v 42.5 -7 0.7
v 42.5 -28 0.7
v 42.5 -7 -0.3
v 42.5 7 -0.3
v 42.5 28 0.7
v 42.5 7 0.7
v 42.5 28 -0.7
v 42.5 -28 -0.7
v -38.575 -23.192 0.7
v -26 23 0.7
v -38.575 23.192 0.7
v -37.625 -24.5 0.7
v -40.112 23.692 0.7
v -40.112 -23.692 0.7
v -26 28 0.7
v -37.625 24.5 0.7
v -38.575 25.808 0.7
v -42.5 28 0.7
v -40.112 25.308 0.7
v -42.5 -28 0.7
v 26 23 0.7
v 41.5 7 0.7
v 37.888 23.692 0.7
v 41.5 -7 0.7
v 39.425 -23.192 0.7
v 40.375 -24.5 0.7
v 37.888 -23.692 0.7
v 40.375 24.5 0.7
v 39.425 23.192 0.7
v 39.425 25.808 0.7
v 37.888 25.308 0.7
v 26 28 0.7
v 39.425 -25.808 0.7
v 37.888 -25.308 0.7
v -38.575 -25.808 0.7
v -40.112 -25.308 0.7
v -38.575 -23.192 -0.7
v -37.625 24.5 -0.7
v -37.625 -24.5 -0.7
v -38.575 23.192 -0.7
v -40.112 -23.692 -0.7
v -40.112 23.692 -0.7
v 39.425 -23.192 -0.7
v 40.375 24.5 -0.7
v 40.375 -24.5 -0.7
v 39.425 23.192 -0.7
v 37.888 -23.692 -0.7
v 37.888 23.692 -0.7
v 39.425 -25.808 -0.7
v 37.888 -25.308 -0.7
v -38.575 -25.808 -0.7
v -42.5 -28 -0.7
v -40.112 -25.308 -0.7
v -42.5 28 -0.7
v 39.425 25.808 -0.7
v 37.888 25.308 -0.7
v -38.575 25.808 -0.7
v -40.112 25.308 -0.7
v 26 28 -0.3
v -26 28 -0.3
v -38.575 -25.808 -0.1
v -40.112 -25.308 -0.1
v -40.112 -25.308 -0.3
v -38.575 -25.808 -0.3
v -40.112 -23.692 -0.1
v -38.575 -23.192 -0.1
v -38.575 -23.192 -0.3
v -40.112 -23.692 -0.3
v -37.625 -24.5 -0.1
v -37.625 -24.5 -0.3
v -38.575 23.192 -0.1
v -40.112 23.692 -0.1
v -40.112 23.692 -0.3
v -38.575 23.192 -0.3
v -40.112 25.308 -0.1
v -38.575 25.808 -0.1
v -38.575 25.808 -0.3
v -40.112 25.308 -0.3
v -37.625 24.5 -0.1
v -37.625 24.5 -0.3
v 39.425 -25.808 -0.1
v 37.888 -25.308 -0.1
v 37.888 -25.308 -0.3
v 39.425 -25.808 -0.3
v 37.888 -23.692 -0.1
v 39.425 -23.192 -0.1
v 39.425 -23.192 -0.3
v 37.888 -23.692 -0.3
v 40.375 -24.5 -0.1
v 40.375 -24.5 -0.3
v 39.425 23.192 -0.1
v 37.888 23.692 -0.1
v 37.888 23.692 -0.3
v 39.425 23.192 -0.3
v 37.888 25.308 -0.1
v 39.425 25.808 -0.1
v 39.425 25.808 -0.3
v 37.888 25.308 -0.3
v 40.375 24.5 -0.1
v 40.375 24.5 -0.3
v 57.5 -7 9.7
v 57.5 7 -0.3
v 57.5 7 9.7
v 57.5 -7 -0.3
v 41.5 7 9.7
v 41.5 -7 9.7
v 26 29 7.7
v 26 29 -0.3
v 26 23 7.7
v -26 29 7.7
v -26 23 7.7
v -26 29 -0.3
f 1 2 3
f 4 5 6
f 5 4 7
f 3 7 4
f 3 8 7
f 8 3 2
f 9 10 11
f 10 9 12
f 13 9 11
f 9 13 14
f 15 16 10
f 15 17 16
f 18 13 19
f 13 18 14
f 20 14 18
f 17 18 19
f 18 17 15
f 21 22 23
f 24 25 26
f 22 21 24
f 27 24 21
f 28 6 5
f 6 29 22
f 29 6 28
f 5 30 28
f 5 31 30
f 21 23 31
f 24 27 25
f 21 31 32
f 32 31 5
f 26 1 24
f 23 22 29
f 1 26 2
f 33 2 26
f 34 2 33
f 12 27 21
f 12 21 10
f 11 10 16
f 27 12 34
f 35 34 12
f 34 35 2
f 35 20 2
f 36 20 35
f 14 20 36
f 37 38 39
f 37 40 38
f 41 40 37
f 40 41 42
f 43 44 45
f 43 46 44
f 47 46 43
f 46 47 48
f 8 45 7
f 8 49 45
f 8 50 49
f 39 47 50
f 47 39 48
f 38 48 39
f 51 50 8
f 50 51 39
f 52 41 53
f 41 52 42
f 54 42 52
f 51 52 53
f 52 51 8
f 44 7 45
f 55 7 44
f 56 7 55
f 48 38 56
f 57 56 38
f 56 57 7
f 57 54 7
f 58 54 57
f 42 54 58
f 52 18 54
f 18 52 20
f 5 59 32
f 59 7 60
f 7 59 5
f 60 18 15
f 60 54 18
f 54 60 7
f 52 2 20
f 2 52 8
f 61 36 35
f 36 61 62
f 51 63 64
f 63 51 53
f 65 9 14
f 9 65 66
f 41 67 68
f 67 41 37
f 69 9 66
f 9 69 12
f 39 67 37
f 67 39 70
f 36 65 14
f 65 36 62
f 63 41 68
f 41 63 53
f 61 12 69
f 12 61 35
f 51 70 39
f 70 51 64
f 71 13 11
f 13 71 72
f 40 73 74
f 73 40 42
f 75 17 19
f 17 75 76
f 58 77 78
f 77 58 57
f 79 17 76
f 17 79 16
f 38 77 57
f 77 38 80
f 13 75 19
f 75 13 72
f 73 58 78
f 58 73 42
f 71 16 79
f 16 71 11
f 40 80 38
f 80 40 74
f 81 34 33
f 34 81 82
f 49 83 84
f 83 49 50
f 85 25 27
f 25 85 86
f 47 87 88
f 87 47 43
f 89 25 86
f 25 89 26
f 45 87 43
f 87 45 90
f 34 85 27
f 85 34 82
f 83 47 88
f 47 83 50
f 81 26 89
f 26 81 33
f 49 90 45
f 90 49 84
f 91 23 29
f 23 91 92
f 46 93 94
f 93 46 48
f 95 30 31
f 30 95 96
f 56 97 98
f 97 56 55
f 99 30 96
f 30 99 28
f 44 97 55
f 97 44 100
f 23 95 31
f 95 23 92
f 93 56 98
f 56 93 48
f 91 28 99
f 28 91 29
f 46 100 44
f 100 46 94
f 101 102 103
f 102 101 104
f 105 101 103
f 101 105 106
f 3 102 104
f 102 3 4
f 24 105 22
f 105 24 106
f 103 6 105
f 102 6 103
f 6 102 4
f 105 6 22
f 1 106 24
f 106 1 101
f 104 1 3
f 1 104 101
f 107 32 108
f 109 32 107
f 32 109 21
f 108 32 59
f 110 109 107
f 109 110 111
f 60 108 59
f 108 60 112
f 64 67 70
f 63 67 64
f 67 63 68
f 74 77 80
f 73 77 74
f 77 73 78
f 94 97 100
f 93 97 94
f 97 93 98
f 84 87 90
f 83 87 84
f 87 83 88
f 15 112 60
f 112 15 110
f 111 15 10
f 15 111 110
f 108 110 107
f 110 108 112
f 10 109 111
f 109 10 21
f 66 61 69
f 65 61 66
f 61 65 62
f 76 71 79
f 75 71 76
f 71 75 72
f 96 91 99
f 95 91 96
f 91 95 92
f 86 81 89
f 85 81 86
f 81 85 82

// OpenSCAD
// Parameters
pcb_length = 85; //[42.5:170:0.5]
pcb_width = 56; //[28:112:0.5]
pcb_thickness = 1.4; //[0.7:2.8:0.1]
corner_radius = 3; //[1.5:6:0.5]
mount_hole_diameter = 2.75; //[2:4:0.05]
mount_hole_edge_offset_x = 3.5; //[2:7:0.25]
mount_hole_edge_offset_y = 3.5; //[2:7:0.25]
hole_cut_extra_height = 2; //[1:5:0.5]
overlap = 1; //[0.5:2:0.1]
connector_height = 12; //[6:24:0.5]
usb_block_length = 16; //[8:32:0.5]
usb_block_width = 14; //[7:28:0.5]
usb_block_height = 10; //[5:20:0.5]
header_length = 52; //[26:80:0.5]
header_width = 6; //[3:12:0.25]
header_height = 8; //[4:16:0.5]
silkscreen_thickness = 0.2; //[0.1:0.6:0.05]
silkscreen_margin = 2; //[1:5:0.25]

// Main PCB Body with Rounded Corners
module pcb_main_body() {
  color([0.0, 0.4, 0.2]) // Green for PCB
  difference() {
    union() {
      translate([0, 0, 0])
        cube([pcb_length, pcb_width, pcb_thickness], center=true);
      translate([pcb_length/2 - corner_radius, pcb_width/2 - corner_radius, 0])
        cylinder(r=corner_radius, h=pcb_thickness, center=true);
      translate([-pcb_length/2 + corner_radius, pcb_width/2 - corner_radius, 0])
        cylinder(r=corner_radius, h=pcb_thickness, center=true);
      translate([-pcb_length/2 + corner_radius, -pcb_width/2 + corner_radius, 0])
        cylinder(r=corner_radius, h=pcb_thickness, center=true);
      translate([pcb_length/2 - corner_radius, -pcb_width/2 + corner_radius, 0])
        cylinder(r=corner_radius, h=pcb_thickness, center=true);
    }
    // Mounting Holes
    for (x = [-1, 1], y = [-1, 1]) {
      translate([x * (pcb_length/2 - mount_hole_edge_offset_x), y * (pcb_width/2 - mount_hole_edge_offset_y), 0])
        cylinder(r=mount_hole_diameter/2, h=pcb_thickness + hole_cut_extra_height, center=true);
    }
  }
}

// Connectors Placeholder
module connectors_placeholder() {
  color([0.85, 0.85, 0.8]) // Off-white for connectors
  union() {
    translate([pcb_length/2 + usb_block_length/2 - overlap, 0, pcb_thickness/2 + usb_block_height/2 - overlap])
      cube([usb_block_length, usb_block_width, usb_block_height], center=true);
    translate([0, pcb_width/2 - header_width/2 + overlap, pcb_thickness/2 + header_height/2 - overlap])
      cube([header_length, header_width, header_height], center=true);
  }
}

// Silkscreen Details
module silkscreen_details() {
  color([1, 1, 1]) // White for silkscreen
  translate([0, 0, pcb_thickness/2 + silkscreen_thickness/2 - overlap])
    cube([pcb_length - 2*silkscreen_margin, pcb_width - 2*silkscreen_margin, silkscreen_thickness], center=true);
}

// Final Assembly
module final_assembly() {
  union() {
    pcb_main_body();
    connectors_placeholder();
    silkscreen_details();
  }
}

// Render the final output
final_assembly();
